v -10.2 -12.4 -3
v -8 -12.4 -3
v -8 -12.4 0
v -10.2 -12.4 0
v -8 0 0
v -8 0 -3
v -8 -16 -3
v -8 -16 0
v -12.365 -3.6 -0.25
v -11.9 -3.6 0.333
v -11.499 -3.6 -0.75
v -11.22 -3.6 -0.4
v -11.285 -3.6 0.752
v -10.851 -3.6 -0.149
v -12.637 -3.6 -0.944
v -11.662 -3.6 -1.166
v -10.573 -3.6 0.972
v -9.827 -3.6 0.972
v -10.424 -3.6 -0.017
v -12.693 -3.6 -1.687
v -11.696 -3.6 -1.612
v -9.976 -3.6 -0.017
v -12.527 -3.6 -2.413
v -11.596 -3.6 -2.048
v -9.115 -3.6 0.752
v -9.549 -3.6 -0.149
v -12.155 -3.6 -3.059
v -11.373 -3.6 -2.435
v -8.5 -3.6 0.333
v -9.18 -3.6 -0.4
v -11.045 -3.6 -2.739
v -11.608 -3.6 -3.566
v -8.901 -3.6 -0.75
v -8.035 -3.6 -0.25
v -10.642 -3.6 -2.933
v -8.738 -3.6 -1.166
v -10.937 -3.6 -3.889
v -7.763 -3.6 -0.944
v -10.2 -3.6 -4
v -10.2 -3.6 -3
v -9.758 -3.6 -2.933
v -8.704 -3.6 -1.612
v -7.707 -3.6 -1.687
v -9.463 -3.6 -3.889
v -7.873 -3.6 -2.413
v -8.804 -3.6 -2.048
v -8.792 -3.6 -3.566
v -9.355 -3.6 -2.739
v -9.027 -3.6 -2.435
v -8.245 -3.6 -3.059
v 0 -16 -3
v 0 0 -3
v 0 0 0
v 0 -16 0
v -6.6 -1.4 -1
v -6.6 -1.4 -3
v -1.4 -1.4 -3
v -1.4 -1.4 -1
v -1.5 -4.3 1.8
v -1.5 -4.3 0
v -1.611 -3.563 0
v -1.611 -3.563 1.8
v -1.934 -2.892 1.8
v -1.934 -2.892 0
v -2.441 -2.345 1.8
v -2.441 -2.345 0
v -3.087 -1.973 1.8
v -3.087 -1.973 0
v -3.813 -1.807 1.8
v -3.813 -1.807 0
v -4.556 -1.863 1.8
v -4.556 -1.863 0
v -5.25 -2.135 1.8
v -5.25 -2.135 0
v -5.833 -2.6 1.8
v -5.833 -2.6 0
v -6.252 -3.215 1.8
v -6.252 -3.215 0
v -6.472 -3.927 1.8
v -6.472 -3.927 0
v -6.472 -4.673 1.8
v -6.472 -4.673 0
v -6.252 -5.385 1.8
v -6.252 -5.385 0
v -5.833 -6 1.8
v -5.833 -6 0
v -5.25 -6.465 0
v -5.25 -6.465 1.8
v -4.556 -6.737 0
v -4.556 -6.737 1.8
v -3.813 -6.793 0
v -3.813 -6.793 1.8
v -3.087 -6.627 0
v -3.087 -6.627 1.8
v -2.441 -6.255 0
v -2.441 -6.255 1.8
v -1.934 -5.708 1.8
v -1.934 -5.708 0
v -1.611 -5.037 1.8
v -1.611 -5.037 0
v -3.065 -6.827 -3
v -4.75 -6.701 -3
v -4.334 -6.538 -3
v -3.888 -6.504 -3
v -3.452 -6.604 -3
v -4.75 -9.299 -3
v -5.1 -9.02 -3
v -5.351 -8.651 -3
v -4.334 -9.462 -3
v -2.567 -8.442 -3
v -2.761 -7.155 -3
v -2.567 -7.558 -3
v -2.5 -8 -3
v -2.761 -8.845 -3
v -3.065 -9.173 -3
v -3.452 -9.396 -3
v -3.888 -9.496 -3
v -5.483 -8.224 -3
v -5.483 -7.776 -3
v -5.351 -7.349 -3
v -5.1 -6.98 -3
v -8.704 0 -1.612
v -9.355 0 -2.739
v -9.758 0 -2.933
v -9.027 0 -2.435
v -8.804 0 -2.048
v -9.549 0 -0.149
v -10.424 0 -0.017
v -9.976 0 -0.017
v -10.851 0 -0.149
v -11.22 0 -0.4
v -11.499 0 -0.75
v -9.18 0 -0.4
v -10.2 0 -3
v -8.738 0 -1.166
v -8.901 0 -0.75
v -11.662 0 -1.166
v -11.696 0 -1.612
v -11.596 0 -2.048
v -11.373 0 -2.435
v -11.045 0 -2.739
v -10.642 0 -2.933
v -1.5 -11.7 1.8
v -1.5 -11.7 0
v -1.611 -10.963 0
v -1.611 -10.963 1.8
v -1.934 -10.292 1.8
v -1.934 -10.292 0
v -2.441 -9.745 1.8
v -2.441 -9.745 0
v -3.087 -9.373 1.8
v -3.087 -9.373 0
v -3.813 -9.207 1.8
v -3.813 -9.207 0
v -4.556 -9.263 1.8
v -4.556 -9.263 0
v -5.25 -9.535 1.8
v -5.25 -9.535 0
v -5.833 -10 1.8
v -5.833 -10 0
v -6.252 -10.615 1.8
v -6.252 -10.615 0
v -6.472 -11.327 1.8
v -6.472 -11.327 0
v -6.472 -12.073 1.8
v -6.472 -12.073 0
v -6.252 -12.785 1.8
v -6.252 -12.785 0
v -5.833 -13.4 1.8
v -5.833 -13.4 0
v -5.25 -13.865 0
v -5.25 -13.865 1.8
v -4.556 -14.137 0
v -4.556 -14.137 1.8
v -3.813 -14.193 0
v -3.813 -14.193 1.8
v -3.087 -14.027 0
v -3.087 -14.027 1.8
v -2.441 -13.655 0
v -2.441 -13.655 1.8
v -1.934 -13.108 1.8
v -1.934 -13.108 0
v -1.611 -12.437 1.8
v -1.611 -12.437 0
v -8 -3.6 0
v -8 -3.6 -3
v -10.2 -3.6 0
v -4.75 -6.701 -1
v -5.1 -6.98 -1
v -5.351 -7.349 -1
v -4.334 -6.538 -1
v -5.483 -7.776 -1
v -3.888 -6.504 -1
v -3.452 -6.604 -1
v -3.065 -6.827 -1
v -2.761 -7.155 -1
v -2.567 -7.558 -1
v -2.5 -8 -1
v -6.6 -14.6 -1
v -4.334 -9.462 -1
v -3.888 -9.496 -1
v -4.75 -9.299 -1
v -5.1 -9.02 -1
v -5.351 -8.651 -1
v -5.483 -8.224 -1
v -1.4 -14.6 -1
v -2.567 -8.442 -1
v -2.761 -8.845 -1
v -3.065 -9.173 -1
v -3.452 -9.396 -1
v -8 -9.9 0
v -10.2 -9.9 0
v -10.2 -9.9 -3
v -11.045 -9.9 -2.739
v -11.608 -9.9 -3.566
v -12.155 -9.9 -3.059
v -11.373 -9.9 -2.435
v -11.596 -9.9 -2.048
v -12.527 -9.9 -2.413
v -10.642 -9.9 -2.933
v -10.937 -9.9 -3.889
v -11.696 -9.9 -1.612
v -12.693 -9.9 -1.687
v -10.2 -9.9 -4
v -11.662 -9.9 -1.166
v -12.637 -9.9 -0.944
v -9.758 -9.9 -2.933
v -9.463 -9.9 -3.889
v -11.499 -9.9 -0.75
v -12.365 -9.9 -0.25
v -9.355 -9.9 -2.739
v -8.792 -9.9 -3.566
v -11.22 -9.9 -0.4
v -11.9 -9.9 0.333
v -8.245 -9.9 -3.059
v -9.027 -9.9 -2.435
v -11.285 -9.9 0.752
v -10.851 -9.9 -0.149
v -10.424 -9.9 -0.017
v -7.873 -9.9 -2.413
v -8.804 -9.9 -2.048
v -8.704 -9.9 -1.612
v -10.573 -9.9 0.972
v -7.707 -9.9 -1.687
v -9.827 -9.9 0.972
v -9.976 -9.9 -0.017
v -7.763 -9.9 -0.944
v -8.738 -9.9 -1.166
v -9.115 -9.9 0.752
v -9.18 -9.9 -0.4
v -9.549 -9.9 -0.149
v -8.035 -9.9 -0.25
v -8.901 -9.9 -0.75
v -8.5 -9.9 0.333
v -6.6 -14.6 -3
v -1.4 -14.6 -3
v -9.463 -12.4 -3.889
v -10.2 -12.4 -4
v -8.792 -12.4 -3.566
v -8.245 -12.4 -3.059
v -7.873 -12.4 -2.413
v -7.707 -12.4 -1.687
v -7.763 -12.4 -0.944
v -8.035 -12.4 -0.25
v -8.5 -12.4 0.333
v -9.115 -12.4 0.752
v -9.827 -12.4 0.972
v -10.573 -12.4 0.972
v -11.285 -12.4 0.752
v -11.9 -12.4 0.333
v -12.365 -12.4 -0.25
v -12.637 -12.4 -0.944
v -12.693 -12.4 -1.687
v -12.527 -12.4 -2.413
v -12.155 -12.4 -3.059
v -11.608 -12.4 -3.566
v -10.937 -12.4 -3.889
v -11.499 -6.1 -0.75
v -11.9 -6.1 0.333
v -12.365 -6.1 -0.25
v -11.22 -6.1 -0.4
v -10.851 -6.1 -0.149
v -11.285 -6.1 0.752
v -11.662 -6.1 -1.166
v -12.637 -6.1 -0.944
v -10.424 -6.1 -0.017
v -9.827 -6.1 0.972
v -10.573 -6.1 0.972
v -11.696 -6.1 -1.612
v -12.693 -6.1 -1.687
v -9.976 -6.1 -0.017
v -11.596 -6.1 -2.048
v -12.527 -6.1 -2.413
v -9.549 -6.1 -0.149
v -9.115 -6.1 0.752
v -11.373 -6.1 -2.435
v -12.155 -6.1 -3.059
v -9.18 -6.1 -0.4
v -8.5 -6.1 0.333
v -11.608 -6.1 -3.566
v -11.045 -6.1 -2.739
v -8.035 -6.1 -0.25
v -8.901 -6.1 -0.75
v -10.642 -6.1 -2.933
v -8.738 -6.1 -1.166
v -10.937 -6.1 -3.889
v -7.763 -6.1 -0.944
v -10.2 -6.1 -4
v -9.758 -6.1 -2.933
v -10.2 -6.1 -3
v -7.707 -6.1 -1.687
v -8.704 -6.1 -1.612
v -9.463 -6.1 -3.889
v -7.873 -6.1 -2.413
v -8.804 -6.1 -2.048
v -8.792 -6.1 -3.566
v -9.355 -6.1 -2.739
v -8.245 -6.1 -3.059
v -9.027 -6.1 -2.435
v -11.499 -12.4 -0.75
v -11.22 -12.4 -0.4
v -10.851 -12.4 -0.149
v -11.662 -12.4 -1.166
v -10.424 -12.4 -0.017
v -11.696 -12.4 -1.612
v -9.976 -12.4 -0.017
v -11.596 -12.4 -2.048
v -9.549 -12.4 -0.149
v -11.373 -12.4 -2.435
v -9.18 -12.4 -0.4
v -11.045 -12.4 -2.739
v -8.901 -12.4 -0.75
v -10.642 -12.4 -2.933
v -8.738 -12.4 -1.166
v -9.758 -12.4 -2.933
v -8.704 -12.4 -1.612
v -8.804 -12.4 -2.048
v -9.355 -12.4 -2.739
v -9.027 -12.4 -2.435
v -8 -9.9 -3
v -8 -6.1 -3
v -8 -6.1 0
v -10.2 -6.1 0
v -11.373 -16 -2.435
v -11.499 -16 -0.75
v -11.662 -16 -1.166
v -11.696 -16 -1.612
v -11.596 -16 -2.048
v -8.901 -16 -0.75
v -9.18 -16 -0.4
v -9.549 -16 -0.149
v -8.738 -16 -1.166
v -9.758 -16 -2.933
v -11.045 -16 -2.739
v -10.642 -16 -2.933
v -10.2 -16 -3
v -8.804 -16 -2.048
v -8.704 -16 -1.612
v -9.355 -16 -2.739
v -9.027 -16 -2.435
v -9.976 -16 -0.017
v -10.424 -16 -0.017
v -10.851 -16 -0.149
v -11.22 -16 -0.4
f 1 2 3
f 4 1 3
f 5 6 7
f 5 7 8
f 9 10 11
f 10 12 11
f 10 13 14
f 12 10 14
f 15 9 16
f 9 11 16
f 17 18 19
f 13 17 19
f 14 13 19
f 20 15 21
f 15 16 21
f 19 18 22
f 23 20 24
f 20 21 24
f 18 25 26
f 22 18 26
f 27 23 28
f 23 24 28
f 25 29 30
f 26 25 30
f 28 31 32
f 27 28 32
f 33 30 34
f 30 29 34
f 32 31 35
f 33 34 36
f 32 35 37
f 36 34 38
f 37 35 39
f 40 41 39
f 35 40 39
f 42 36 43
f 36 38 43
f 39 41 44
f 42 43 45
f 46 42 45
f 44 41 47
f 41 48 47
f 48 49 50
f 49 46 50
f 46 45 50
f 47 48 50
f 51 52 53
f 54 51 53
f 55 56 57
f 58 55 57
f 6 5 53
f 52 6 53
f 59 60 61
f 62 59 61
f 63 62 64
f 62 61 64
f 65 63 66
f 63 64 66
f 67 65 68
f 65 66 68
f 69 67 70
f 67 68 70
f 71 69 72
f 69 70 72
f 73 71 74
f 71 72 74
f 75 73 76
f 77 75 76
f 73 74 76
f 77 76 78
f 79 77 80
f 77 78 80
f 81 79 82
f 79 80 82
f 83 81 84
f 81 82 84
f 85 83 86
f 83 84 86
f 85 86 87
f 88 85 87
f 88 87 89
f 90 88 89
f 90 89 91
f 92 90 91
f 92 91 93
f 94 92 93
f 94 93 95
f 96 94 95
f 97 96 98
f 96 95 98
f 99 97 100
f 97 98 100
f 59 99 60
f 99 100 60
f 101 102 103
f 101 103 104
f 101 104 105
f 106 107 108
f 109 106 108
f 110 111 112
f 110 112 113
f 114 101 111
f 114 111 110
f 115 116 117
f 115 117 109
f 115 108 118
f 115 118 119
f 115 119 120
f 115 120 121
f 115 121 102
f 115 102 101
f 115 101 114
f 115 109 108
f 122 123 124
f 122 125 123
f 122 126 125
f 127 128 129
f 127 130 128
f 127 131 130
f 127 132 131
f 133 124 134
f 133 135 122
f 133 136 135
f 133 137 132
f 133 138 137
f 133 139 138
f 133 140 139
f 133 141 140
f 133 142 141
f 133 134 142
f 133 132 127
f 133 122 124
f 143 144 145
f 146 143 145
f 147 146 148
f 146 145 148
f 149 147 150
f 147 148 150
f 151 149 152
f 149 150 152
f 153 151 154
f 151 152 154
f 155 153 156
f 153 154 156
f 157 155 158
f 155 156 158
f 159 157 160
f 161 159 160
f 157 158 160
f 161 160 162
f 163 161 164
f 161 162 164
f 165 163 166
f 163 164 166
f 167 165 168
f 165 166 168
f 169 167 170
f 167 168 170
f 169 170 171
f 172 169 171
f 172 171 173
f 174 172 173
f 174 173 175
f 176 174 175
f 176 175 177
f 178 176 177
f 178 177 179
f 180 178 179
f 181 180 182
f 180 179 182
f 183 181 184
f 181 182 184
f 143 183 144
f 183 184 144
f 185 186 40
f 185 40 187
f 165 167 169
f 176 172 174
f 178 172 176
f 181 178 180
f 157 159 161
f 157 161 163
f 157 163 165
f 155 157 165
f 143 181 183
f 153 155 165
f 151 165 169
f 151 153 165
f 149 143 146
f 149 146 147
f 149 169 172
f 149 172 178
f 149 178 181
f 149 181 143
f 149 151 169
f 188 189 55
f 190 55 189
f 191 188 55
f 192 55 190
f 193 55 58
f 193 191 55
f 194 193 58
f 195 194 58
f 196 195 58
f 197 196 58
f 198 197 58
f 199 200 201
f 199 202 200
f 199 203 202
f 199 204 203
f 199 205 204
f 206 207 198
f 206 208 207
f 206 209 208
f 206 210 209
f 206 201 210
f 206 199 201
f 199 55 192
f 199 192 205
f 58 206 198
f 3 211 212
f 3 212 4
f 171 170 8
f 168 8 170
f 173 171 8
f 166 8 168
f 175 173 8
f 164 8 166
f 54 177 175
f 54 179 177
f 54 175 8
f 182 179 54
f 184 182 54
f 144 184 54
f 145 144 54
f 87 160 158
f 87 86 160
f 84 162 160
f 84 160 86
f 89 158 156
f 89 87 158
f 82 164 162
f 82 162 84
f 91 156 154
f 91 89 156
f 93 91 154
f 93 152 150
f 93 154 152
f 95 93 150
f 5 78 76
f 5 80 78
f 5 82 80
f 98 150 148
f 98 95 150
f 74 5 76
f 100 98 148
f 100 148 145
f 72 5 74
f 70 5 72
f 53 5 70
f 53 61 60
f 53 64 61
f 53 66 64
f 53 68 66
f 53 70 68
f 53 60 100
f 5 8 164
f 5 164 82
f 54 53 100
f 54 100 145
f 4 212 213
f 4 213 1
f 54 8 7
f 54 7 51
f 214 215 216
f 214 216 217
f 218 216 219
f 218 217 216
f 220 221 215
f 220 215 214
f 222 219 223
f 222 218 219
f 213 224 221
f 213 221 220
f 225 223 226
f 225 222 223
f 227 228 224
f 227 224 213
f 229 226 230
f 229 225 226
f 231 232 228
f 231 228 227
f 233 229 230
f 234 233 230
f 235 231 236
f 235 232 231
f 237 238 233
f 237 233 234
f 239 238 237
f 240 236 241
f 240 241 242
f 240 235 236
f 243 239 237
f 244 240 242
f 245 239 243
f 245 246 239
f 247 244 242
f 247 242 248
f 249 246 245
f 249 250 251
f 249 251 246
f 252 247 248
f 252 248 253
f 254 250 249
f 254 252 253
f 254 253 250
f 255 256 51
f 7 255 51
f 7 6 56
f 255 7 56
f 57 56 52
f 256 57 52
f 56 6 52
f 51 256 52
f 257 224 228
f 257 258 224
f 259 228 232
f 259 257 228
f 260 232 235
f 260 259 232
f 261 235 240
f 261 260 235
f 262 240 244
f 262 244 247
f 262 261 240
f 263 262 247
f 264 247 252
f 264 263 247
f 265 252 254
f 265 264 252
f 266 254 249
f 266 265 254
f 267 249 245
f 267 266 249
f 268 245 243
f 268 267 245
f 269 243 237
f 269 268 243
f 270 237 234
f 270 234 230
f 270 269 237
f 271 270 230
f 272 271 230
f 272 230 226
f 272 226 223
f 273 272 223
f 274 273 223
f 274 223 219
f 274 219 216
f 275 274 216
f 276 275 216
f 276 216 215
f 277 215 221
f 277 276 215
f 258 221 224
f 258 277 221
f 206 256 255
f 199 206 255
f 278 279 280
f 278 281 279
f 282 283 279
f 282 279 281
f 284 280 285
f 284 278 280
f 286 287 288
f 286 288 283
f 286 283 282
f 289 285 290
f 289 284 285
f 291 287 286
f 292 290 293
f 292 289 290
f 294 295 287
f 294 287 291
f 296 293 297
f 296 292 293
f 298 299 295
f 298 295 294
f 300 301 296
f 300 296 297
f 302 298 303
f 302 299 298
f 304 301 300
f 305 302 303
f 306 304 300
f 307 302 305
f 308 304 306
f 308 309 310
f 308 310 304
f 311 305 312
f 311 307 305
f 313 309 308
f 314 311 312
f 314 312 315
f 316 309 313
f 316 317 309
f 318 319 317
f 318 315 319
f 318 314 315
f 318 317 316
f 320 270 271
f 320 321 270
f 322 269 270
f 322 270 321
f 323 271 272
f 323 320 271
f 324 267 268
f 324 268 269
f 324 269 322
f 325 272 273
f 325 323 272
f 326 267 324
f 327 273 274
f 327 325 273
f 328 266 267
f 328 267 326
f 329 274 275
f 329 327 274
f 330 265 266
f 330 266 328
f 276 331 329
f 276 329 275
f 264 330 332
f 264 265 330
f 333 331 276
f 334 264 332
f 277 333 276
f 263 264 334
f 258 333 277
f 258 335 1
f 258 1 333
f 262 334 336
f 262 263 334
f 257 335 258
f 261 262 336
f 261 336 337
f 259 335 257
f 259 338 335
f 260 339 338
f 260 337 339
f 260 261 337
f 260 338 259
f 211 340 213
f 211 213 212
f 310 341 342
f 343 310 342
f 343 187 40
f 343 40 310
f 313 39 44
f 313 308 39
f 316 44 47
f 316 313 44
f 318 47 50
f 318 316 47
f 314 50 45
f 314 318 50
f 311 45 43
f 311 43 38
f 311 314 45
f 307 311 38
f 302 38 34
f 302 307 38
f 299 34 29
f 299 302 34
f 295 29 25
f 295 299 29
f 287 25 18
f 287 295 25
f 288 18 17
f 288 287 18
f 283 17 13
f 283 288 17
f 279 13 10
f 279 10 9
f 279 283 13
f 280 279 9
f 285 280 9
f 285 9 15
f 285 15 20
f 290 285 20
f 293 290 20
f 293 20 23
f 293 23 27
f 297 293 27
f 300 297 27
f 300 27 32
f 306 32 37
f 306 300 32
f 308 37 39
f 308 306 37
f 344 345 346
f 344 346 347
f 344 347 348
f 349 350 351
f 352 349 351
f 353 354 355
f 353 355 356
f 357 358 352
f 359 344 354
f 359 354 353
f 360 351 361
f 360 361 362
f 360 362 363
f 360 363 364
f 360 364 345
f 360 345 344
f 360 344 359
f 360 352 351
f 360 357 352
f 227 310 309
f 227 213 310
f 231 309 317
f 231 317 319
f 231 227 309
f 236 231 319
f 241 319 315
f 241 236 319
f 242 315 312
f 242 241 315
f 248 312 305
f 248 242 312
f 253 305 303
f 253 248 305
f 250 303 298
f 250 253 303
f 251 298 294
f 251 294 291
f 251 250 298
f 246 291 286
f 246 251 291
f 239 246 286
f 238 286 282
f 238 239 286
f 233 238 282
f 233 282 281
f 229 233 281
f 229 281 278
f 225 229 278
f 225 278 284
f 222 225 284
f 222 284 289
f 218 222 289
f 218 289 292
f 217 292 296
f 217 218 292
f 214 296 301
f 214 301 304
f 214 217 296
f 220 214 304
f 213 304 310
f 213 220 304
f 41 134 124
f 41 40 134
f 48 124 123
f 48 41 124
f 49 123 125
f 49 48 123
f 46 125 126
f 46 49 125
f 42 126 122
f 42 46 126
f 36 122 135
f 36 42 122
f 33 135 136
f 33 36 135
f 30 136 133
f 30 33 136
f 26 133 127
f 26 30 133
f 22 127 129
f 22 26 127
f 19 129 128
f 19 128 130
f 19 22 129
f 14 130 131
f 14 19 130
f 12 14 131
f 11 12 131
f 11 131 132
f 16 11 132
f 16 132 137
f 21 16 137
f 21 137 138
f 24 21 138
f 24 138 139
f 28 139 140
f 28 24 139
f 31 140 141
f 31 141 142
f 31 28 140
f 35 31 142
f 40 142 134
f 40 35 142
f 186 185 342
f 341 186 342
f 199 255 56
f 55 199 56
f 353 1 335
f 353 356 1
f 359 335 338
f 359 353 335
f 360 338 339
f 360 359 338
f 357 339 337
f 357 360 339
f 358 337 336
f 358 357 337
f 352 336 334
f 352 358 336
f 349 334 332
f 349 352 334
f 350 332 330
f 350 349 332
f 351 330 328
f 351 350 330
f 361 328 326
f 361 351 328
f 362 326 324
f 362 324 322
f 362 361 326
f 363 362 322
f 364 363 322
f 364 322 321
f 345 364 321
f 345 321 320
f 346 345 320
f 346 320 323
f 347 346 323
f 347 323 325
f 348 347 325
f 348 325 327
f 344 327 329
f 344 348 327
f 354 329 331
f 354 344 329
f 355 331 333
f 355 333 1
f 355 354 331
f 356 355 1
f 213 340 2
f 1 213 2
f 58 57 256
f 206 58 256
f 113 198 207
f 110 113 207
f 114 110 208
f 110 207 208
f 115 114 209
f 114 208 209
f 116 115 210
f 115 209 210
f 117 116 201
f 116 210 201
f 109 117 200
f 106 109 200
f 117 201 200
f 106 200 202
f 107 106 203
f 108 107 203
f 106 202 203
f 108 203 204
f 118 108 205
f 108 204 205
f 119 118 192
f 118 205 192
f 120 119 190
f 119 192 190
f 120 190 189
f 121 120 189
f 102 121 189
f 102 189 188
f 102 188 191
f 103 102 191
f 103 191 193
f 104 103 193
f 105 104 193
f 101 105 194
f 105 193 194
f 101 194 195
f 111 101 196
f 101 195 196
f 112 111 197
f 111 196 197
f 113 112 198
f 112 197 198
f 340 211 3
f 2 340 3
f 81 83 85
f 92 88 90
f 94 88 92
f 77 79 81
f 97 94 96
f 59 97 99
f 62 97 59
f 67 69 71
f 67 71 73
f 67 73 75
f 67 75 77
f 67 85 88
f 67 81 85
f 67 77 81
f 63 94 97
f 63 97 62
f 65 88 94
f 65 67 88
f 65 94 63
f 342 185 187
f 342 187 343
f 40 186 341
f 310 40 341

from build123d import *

# Parameters (mm, degrees)
F0_W      = 8
F0_H      = 3
F1_DEPTH  = 16
F2_R      = 2.5
F3_DEPTH  = 1.8
F4_W      = 2.5
F4_H      = 3
F5_DEPTH  = 2.2
F6_W      = 2.5
F6_H      = 1
F6_W_2    = 3.6
F6_H_2    = 1.5
F9_DEPTH  = 2
F10_R     = 1.5
F11_DEPTH = 2


with BuildPart() as f1:
    # F0 (on Front) → F1 (new body)
    with BuildSketch(Plane.XZ):
        with Locations((-4, -1.5)):
            Rectangle(F0_W, F0_H)
    extrude(amount=F1_DEPTH)

    # F2 (on face) → F3 (join)
    with BuildSketch(Plane.XY):
        with Locations((-4, -4.3)):
            Circle(F2_R)
        with Locations((-4, -11.7)):
            Circle(F2_R)
    extrude(amount=F3_DEPTH)

    # F8 (on face) → F9 (cut)
    with BuildSketch(Plane(origin=(0, 0, -3), x_dir=(1, 0, 0), z_dir=(0, 0, -1))):
        Polygon((-6.6, 14.6), (-6.6, 8), (-6.6, 1.4), (-1.4, 1.4), (-1.4, 14.6), align=None)
    extrude(amount=-F9_DEPTH, mode=Mode.SUBTRACT)

    # F10 (on face) → F11 (join)
    with BuildSketch(Plane(origin=(0, 0, -1), x_dir=(1, 0, 0), z_dir=(0, 0, -1))):
        with Locations((-4, 8)):
            Circle(F10_R)
    extrude(amount=F11_DEPTH)


with BuildPart() as f5:
    # F4 (on face) → F5 (new body)
    with BuildSketch(Plane(origin=(-8, 0, 0), x_dir=(0, -1, 0), z_dir=(-1, 0, 0))):
        with Locations((4.85, -1.5)):
            Rectangle(F4_W, F4_H)
    extrude(amount=F5_DEPTH)


with BuildPart() as f5b:
    # F4 (on face) → F5, piece 2 (new body)
    with BuildSketch(Plane(origin=(-8, 0, 0), x_dir=(0, -1, 0), z_dir=(-1, 0, 0))):
        with Locations((11.15, -1.5)):
            Rectangle(F4_W, F4_H)
    extrude(amount=F5_DEPTH)


with BuildPart() as f7:
    # F6 (on face) → F7 (revolve)
    with BuildSketch(Plane(origin=(-10.2, 0, 0), x_dir=(0, -1, 0), z_dir=(-1, 0, 0))):
        with Locations((4.85, -3.5)):
            Rectangle(F6_W, F6_H)
        with Locations((11.15, -3.5)):
            Rectangle(F6_W, F6_H)
        with Locations((14.2, -2.25)):
            Rectangle(F6_W_2, F6_H_2)
        with Locations((11.15, -2.25)):
            Rectangle(F6_W, F6_H_2)
        Polygon((6.1, -3), (9.9, -3), (9.9, -1.5), (0, -1.5), (0, -3), (3.6, -3), align=None)
    revolve(axis=Axis((-10.2, -8, -1.5), (0, -1, 0)))


solid = Compound([f1.part, f5.part, f5b.part, f7.part])
